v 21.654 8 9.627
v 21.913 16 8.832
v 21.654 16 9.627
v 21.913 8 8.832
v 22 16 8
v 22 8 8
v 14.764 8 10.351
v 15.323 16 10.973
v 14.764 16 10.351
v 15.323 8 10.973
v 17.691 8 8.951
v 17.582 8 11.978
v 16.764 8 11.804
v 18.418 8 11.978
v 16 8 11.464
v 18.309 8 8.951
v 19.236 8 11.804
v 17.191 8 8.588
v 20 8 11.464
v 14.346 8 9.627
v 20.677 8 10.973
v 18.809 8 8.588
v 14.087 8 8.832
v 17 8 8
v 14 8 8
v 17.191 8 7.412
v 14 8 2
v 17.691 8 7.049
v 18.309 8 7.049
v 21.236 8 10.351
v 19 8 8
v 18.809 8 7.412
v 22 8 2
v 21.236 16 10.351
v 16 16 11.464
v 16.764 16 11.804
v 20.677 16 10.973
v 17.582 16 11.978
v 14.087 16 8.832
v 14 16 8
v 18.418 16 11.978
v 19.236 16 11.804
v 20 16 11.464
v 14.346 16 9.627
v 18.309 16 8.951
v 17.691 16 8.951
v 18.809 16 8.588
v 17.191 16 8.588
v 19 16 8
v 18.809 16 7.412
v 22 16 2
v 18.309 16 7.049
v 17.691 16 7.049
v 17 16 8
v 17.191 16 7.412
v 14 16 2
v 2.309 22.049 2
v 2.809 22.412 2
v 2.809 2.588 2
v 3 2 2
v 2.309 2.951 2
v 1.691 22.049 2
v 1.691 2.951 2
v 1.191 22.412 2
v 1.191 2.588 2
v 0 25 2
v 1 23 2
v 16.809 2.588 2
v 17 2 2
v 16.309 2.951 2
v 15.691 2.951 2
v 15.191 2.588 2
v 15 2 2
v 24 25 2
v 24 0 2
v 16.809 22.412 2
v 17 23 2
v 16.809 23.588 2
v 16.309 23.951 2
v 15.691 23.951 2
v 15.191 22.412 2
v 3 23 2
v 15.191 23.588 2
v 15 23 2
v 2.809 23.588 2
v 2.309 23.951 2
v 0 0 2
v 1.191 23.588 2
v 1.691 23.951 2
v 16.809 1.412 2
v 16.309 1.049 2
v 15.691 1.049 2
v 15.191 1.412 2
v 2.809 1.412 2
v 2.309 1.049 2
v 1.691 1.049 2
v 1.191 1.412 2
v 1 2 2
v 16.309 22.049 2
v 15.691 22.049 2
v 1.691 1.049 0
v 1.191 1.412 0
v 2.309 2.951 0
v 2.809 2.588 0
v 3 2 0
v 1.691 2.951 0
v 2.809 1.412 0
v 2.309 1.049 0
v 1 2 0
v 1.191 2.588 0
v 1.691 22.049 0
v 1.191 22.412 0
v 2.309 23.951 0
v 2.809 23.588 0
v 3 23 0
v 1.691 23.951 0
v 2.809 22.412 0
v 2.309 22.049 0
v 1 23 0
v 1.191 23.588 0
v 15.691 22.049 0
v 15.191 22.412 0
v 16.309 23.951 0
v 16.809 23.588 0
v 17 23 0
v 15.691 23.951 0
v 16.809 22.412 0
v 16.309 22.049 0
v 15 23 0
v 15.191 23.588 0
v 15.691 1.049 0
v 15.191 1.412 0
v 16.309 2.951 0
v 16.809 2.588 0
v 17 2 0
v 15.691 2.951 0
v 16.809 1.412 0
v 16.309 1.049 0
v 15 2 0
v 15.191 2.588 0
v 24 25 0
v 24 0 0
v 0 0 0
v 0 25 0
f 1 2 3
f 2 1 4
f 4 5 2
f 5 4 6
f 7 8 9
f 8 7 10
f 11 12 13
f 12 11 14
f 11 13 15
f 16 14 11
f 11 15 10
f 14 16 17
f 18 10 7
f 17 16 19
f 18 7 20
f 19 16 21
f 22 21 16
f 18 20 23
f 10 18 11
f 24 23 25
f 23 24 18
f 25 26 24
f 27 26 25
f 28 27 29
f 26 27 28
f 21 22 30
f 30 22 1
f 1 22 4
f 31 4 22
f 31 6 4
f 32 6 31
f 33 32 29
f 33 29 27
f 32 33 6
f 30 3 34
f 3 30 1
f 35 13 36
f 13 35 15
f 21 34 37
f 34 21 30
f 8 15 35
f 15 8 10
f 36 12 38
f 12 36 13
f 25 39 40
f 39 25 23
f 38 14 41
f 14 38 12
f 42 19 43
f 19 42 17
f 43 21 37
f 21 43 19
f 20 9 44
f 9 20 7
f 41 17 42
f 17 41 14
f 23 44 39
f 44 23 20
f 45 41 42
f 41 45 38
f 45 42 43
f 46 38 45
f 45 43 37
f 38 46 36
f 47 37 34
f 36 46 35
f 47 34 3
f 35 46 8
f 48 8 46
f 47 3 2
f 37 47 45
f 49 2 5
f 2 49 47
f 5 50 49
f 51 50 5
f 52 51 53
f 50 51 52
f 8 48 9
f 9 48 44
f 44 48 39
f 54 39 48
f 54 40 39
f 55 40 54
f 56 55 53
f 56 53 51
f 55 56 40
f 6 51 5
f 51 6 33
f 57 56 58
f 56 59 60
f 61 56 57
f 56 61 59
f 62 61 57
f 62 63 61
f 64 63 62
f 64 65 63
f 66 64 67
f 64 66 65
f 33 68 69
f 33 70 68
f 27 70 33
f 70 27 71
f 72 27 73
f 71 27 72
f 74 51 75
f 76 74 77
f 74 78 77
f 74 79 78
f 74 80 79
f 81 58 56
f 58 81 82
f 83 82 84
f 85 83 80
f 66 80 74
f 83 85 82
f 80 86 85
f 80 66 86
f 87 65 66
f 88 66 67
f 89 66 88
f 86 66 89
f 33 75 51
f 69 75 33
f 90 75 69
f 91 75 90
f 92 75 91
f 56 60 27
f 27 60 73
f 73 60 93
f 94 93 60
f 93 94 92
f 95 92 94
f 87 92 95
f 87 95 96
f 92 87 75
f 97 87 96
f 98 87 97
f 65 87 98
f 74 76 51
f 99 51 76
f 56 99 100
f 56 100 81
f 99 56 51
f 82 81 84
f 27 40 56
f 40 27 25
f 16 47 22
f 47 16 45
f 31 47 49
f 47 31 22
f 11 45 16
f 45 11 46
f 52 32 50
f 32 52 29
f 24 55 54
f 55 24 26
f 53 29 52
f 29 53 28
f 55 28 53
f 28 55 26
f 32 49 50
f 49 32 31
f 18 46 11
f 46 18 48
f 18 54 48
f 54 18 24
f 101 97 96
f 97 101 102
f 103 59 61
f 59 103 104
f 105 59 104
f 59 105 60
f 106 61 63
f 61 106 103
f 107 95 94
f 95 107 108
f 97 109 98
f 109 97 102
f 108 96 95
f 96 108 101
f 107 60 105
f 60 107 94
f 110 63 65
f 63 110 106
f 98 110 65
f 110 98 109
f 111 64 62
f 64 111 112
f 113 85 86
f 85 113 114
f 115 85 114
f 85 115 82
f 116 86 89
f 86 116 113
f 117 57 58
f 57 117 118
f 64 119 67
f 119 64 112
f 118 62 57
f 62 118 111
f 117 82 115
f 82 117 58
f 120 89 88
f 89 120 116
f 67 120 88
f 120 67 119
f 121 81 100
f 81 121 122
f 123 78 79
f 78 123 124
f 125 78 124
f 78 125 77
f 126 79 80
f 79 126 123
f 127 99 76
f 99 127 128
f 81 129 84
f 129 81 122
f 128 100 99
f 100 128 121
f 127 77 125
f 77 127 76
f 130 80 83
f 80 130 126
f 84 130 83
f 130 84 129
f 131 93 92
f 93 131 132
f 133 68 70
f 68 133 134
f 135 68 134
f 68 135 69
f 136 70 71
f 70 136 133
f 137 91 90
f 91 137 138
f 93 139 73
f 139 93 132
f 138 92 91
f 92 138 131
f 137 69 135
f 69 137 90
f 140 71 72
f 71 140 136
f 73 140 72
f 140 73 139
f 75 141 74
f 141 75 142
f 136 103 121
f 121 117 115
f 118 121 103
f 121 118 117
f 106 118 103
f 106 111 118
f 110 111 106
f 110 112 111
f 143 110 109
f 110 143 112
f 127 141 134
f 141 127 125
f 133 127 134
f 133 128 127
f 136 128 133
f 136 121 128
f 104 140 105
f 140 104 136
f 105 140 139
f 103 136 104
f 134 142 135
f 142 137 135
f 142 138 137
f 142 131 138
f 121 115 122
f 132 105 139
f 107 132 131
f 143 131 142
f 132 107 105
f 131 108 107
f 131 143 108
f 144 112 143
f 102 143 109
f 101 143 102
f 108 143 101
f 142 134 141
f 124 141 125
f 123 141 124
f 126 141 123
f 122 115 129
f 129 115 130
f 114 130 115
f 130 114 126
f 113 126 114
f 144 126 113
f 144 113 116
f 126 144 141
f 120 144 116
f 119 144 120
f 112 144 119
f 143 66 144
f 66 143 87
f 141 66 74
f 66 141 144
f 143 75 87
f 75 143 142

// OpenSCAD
translate([14, 8, 2]){
    difference(){
        union(){
            translate([4, 8, 6]){
                rotate([90, 0, 0]){
                    cylinder(8, r=4, $fn=30);
                }
            }
            cube([8,8, 6]);
        }
        translate([4, 8, 6]){
            rotate([90, 0, 0]){
                cylinder(10, r=1, $fn=10);
            }
        }
    }
}

difference(){
    cube([24, 25, 2]);
    union(){
        translate([2, 2, -1]){
            cylinder(4, r=1, $fn=10);
        }
        
        translate([2, 23, -1]){
            cylinder(4, r=1, $fn=10);
        }
        
        translate([16, 23, -1]){
            cylinder(4, r=1, $fn=10);
        }
        translate([16, 2, -1]){
            cylinder(4, r=1, $fn=10);
        }
    }
}
